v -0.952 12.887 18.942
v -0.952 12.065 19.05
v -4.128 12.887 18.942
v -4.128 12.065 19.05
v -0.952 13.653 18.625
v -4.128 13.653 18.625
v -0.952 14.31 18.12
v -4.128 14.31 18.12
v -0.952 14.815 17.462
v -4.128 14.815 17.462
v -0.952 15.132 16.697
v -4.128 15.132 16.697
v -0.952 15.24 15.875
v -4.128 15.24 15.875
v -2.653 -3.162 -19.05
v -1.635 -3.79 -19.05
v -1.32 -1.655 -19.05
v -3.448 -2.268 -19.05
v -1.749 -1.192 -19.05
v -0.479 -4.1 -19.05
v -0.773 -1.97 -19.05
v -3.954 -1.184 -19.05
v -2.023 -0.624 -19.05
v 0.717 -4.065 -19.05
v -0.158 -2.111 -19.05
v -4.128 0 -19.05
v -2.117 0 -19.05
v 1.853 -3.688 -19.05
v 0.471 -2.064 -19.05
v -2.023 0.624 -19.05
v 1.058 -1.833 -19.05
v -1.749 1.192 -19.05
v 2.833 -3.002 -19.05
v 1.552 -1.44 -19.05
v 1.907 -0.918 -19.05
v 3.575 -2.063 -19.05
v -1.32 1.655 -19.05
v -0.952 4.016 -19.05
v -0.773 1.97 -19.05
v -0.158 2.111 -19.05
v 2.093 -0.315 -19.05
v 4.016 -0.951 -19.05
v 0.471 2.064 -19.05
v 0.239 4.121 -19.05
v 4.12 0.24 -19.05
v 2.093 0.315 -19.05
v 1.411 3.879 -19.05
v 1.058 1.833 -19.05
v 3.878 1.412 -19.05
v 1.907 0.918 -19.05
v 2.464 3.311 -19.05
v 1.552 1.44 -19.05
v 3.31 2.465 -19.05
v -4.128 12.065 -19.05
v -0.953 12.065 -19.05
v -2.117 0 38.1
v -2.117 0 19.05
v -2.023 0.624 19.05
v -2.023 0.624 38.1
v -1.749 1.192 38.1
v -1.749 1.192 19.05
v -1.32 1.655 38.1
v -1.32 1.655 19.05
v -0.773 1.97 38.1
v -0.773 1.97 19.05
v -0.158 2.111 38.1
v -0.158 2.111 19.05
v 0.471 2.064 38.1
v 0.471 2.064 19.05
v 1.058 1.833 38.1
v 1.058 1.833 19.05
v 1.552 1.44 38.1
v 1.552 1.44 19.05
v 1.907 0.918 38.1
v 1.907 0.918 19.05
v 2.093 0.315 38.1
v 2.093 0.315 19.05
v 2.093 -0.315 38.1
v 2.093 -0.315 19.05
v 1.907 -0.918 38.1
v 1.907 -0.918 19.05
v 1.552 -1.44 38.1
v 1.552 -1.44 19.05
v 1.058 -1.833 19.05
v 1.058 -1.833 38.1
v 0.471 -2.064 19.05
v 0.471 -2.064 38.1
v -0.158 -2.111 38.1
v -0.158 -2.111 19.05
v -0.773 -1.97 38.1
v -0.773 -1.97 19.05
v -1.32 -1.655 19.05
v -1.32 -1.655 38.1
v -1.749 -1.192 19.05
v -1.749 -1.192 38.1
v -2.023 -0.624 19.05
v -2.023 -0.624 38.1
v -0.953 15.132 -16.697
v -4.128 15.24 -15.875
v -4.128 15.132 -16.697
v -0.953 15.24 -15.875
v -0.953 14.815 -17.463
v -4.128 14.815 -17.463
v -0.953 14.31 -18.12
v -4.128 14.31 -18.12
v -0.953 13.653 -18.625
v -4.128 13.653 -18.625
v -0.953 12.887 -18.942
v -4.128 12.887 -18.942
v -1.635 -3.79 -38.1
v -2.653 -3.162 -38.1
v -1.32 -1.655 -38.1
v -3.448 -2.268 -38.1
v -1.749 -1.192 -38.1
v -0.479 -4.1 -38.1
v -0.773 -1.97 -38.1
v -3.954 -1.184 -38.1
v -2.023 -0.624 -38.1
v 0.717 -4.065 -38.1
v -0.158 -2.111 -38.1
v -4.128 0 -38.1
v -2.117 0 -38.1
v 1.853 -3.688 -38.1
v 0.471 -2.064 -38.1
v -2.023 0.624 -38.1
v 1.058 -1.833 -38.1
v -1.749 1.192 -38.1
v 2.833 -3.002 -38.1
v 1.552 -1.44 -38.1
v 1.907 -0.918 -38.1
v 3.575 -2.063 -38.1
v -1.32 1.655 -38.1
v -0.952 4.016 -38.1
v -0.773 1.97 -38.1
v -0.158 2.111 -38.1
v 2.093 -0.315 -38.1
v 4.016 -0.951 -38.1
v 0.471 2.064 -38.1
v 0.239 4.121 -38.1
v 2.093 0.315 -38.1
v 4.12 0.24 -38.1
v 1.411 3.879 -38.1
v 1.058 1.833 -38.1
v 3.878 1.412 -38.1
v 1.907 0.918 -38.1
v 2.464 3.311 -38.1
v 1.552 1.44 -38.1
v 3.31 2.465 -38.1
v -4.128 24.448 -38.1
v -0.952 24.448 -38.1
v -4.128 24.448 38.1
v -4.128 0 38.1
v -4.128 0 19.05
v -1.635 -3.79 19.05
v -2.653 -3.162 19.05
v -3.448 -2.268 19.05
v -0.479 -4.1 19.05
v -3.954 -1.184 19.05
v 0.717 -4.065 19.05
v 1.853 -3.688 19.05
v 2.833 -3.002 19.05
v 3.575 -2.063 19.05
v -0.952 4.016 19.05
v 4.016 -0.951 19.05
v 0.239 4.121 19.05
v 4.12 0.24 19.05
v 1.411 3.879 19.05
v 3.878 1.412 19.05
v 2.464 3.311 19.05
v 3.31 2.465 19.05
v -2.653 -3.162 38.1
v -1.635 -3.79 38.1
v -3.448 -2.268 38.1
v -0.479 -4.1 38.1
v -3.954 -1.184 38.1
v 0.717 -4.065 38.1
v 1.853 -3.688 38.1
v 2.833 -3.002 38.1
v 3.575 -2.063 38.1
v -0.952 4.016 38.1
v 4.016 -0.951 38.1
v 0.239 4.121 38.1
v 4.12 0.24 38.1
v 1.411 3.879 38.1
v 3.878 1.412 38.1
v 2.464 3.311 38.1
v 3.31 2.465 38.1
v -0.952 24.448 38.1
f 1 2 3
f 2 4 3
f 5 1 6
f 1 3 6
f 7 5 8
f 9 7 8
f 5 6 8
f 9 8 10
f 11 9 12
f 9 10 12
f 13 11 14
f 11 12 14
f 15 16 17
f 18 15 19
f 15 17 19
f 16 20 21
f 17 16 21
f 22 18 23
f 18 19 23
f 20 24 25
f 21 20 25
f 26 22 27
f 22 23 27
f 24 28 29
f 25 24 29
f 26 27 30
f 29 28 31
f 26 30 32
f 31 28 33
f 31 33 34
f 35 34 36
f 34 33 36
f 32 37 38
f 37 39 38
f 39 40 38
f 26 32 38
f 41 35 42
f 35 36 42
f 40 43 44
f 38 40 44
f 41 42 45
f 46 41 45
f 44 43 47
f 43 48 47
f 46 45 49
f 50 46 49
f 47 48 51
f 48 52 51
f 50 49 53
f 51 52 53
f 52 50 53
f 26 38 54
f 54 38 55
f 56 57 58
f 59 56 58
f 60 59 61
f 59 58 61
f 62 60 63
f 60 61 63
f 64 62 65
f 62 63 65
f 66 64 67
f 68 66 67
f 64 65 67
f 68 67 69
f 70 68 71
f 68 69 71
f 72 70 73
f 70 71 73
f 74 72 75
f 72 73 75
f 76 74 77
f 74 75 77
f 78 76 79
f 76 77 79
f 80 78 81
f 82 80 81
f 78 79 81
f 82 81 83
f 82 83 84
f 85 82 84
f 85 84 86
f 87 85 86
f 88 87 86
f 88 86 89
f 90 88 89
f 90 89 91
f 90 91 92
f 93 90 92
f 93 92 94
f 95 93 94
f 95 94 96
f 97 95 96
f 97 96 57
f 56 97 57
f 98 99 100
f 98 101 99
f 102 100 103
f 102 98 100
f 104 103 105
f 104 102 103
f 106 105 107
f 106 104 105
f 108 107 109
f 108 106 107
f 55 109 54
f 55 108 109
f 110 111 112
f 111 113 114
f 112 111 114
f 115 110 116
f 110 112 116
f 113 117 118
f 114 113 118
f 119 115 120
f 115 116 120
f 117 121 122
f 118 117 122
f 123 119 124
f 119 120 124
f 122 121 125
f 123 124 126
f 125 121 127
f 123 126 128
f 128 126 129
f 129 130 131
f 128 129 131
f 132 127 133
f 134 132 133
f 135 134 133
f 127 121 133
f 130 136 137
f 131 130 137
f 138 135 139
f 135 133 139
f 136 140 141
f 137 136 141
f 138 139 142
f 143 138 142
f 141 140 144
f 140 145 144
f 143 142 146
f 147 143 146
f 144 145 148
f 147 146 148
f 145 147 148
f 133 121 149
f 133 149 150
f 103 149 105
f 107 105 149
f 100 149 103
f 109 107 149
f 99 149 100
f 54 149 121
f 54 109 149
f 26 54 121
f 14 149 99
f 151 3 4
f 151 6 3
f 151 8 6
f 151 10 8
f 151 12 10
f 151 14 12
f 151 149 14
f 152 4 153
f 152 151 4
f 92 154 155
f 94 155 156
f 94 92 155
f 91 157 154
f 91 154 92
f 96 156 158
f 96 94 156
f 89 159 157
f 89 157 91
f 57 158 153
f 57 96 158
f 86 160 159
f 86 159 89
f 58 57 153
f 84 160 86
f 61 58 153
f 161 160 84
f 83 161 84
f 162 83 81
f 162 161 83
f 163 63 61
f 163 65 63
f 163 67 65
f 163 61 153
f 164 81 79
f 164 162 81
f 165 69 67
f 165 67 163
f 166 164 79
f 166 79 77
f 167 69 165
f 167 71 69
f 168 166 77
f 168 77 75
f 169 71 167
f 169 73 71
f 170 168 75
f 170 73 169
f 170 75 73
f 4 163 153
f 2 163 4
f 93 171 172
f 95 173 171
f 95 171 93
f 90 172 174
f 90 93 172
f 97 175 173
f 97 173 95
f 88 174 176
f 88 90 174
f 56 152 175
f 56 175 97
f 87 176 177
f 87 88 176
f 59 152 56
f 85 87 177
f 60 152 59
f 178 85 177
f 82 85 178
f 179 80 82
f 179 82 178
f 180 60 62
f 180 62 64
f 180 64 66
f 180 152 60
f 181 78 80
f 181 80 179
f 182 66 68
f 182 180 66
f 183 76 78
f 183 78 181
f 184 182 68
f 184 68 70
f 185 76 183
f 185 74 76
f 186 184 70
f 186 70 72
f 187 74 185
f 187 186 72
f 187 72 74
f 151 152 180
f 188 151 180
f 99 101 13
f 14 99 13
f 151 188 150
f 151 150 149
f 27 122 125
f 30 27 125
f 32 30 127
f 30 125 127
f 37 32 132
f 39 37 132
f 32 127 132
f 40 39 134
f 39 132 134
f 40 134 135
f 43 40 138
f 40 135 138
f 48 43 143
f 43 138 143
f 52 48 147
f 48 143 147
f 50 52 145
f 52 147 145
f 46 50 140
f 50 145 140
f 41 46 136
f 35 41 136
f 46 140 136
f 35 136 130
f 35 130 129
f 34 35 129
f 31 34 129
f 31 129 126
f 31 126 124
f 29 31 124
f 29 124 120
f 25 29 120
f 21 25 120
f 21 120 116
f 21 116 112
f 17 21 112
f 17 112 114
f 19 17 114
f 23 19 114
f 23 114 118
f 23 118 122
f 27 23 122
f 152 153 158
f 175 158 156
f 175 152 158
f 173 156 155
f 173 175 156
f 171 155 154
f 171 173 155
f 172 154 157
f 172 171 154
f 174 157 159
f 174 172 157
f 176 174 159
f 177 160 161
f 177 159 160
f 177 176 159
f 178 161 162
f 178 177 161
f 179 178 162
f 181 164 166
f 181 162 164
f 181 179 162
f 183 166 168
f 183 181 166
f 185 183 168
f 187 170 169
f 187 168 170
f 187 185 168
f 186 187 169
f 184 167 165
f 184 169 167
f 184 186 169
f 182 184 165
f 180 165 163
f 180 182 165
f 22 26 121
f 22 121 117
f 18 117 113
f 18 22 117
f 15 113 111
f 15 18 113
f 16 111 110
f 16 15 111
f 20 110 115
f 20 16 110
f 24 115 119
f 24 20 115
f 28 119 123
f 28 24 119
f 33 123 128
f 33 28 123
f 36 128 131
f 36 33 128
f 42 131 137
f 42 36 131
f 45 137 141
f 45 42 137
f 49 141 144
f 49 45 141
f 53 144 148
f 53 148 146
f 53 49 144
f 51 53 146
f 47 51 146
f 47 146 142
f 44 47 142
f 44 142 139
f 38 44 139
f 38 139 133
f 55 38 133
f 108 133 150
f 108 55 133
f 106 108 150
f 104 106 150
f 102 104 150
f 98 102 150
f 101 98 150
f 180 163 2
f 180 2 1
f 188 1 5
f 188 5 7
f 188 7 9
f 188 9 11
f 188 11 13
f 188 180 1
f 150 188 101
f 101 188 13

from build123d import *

# Parameters (mm, degrees)
F1_DEPTH = 38.1
F3_D     = 4.2333333333
F4_W     = 19.3675
F4_H     = 38.1
F5_DEPTH = 12.7
F6_R     = 3.175


with BuildPart() as f1:
    # F0 (on Top) → F1 (new body, symmetric)
    with BuildSketch(Plane.XY):
        with BuildLine():
            Line((-0.9525, 4.0160926284), (-0.9525, 24.4475))
            Line((-0.9525, 24.4475), (-4.1275, 24.4475))
            Line((-4.1275, 24.4475), (-4.1275, 0))
            ThreePointArc((-4.1275, 0), (3.2378773911, -2.5597668351), (-0.9525, 4.0160926284))
        make_face()
    extrude(amount=F1_DEPTH, both=True)

    # F3 (through all)
    with Locations(Plane.XY.offset(38.1)):
        with Locations((0, 0)):
            Hole(F3_D / 2)

    # F4 (on face) → F5 (cut, symmetric)
    with BuildSketch(Plane.YZ.offset(-0.9525)):
        with Locations((5.55625, 0)):
            Rectangle(F4_W, F4_H)
    extrude(amount=F5_DEPTH, both=True, mode=Mode.SUBTRACT)

    # F6
    f6_edges = [f1.edges().sort_by_distance(p)[0] for p in [
        (-2.54, 15.24, 19.05),
        (-2.54, 15.24, -19.05),
    ]]
    fillet(f6_edges, radius=F6_R)


solid = f1.part
